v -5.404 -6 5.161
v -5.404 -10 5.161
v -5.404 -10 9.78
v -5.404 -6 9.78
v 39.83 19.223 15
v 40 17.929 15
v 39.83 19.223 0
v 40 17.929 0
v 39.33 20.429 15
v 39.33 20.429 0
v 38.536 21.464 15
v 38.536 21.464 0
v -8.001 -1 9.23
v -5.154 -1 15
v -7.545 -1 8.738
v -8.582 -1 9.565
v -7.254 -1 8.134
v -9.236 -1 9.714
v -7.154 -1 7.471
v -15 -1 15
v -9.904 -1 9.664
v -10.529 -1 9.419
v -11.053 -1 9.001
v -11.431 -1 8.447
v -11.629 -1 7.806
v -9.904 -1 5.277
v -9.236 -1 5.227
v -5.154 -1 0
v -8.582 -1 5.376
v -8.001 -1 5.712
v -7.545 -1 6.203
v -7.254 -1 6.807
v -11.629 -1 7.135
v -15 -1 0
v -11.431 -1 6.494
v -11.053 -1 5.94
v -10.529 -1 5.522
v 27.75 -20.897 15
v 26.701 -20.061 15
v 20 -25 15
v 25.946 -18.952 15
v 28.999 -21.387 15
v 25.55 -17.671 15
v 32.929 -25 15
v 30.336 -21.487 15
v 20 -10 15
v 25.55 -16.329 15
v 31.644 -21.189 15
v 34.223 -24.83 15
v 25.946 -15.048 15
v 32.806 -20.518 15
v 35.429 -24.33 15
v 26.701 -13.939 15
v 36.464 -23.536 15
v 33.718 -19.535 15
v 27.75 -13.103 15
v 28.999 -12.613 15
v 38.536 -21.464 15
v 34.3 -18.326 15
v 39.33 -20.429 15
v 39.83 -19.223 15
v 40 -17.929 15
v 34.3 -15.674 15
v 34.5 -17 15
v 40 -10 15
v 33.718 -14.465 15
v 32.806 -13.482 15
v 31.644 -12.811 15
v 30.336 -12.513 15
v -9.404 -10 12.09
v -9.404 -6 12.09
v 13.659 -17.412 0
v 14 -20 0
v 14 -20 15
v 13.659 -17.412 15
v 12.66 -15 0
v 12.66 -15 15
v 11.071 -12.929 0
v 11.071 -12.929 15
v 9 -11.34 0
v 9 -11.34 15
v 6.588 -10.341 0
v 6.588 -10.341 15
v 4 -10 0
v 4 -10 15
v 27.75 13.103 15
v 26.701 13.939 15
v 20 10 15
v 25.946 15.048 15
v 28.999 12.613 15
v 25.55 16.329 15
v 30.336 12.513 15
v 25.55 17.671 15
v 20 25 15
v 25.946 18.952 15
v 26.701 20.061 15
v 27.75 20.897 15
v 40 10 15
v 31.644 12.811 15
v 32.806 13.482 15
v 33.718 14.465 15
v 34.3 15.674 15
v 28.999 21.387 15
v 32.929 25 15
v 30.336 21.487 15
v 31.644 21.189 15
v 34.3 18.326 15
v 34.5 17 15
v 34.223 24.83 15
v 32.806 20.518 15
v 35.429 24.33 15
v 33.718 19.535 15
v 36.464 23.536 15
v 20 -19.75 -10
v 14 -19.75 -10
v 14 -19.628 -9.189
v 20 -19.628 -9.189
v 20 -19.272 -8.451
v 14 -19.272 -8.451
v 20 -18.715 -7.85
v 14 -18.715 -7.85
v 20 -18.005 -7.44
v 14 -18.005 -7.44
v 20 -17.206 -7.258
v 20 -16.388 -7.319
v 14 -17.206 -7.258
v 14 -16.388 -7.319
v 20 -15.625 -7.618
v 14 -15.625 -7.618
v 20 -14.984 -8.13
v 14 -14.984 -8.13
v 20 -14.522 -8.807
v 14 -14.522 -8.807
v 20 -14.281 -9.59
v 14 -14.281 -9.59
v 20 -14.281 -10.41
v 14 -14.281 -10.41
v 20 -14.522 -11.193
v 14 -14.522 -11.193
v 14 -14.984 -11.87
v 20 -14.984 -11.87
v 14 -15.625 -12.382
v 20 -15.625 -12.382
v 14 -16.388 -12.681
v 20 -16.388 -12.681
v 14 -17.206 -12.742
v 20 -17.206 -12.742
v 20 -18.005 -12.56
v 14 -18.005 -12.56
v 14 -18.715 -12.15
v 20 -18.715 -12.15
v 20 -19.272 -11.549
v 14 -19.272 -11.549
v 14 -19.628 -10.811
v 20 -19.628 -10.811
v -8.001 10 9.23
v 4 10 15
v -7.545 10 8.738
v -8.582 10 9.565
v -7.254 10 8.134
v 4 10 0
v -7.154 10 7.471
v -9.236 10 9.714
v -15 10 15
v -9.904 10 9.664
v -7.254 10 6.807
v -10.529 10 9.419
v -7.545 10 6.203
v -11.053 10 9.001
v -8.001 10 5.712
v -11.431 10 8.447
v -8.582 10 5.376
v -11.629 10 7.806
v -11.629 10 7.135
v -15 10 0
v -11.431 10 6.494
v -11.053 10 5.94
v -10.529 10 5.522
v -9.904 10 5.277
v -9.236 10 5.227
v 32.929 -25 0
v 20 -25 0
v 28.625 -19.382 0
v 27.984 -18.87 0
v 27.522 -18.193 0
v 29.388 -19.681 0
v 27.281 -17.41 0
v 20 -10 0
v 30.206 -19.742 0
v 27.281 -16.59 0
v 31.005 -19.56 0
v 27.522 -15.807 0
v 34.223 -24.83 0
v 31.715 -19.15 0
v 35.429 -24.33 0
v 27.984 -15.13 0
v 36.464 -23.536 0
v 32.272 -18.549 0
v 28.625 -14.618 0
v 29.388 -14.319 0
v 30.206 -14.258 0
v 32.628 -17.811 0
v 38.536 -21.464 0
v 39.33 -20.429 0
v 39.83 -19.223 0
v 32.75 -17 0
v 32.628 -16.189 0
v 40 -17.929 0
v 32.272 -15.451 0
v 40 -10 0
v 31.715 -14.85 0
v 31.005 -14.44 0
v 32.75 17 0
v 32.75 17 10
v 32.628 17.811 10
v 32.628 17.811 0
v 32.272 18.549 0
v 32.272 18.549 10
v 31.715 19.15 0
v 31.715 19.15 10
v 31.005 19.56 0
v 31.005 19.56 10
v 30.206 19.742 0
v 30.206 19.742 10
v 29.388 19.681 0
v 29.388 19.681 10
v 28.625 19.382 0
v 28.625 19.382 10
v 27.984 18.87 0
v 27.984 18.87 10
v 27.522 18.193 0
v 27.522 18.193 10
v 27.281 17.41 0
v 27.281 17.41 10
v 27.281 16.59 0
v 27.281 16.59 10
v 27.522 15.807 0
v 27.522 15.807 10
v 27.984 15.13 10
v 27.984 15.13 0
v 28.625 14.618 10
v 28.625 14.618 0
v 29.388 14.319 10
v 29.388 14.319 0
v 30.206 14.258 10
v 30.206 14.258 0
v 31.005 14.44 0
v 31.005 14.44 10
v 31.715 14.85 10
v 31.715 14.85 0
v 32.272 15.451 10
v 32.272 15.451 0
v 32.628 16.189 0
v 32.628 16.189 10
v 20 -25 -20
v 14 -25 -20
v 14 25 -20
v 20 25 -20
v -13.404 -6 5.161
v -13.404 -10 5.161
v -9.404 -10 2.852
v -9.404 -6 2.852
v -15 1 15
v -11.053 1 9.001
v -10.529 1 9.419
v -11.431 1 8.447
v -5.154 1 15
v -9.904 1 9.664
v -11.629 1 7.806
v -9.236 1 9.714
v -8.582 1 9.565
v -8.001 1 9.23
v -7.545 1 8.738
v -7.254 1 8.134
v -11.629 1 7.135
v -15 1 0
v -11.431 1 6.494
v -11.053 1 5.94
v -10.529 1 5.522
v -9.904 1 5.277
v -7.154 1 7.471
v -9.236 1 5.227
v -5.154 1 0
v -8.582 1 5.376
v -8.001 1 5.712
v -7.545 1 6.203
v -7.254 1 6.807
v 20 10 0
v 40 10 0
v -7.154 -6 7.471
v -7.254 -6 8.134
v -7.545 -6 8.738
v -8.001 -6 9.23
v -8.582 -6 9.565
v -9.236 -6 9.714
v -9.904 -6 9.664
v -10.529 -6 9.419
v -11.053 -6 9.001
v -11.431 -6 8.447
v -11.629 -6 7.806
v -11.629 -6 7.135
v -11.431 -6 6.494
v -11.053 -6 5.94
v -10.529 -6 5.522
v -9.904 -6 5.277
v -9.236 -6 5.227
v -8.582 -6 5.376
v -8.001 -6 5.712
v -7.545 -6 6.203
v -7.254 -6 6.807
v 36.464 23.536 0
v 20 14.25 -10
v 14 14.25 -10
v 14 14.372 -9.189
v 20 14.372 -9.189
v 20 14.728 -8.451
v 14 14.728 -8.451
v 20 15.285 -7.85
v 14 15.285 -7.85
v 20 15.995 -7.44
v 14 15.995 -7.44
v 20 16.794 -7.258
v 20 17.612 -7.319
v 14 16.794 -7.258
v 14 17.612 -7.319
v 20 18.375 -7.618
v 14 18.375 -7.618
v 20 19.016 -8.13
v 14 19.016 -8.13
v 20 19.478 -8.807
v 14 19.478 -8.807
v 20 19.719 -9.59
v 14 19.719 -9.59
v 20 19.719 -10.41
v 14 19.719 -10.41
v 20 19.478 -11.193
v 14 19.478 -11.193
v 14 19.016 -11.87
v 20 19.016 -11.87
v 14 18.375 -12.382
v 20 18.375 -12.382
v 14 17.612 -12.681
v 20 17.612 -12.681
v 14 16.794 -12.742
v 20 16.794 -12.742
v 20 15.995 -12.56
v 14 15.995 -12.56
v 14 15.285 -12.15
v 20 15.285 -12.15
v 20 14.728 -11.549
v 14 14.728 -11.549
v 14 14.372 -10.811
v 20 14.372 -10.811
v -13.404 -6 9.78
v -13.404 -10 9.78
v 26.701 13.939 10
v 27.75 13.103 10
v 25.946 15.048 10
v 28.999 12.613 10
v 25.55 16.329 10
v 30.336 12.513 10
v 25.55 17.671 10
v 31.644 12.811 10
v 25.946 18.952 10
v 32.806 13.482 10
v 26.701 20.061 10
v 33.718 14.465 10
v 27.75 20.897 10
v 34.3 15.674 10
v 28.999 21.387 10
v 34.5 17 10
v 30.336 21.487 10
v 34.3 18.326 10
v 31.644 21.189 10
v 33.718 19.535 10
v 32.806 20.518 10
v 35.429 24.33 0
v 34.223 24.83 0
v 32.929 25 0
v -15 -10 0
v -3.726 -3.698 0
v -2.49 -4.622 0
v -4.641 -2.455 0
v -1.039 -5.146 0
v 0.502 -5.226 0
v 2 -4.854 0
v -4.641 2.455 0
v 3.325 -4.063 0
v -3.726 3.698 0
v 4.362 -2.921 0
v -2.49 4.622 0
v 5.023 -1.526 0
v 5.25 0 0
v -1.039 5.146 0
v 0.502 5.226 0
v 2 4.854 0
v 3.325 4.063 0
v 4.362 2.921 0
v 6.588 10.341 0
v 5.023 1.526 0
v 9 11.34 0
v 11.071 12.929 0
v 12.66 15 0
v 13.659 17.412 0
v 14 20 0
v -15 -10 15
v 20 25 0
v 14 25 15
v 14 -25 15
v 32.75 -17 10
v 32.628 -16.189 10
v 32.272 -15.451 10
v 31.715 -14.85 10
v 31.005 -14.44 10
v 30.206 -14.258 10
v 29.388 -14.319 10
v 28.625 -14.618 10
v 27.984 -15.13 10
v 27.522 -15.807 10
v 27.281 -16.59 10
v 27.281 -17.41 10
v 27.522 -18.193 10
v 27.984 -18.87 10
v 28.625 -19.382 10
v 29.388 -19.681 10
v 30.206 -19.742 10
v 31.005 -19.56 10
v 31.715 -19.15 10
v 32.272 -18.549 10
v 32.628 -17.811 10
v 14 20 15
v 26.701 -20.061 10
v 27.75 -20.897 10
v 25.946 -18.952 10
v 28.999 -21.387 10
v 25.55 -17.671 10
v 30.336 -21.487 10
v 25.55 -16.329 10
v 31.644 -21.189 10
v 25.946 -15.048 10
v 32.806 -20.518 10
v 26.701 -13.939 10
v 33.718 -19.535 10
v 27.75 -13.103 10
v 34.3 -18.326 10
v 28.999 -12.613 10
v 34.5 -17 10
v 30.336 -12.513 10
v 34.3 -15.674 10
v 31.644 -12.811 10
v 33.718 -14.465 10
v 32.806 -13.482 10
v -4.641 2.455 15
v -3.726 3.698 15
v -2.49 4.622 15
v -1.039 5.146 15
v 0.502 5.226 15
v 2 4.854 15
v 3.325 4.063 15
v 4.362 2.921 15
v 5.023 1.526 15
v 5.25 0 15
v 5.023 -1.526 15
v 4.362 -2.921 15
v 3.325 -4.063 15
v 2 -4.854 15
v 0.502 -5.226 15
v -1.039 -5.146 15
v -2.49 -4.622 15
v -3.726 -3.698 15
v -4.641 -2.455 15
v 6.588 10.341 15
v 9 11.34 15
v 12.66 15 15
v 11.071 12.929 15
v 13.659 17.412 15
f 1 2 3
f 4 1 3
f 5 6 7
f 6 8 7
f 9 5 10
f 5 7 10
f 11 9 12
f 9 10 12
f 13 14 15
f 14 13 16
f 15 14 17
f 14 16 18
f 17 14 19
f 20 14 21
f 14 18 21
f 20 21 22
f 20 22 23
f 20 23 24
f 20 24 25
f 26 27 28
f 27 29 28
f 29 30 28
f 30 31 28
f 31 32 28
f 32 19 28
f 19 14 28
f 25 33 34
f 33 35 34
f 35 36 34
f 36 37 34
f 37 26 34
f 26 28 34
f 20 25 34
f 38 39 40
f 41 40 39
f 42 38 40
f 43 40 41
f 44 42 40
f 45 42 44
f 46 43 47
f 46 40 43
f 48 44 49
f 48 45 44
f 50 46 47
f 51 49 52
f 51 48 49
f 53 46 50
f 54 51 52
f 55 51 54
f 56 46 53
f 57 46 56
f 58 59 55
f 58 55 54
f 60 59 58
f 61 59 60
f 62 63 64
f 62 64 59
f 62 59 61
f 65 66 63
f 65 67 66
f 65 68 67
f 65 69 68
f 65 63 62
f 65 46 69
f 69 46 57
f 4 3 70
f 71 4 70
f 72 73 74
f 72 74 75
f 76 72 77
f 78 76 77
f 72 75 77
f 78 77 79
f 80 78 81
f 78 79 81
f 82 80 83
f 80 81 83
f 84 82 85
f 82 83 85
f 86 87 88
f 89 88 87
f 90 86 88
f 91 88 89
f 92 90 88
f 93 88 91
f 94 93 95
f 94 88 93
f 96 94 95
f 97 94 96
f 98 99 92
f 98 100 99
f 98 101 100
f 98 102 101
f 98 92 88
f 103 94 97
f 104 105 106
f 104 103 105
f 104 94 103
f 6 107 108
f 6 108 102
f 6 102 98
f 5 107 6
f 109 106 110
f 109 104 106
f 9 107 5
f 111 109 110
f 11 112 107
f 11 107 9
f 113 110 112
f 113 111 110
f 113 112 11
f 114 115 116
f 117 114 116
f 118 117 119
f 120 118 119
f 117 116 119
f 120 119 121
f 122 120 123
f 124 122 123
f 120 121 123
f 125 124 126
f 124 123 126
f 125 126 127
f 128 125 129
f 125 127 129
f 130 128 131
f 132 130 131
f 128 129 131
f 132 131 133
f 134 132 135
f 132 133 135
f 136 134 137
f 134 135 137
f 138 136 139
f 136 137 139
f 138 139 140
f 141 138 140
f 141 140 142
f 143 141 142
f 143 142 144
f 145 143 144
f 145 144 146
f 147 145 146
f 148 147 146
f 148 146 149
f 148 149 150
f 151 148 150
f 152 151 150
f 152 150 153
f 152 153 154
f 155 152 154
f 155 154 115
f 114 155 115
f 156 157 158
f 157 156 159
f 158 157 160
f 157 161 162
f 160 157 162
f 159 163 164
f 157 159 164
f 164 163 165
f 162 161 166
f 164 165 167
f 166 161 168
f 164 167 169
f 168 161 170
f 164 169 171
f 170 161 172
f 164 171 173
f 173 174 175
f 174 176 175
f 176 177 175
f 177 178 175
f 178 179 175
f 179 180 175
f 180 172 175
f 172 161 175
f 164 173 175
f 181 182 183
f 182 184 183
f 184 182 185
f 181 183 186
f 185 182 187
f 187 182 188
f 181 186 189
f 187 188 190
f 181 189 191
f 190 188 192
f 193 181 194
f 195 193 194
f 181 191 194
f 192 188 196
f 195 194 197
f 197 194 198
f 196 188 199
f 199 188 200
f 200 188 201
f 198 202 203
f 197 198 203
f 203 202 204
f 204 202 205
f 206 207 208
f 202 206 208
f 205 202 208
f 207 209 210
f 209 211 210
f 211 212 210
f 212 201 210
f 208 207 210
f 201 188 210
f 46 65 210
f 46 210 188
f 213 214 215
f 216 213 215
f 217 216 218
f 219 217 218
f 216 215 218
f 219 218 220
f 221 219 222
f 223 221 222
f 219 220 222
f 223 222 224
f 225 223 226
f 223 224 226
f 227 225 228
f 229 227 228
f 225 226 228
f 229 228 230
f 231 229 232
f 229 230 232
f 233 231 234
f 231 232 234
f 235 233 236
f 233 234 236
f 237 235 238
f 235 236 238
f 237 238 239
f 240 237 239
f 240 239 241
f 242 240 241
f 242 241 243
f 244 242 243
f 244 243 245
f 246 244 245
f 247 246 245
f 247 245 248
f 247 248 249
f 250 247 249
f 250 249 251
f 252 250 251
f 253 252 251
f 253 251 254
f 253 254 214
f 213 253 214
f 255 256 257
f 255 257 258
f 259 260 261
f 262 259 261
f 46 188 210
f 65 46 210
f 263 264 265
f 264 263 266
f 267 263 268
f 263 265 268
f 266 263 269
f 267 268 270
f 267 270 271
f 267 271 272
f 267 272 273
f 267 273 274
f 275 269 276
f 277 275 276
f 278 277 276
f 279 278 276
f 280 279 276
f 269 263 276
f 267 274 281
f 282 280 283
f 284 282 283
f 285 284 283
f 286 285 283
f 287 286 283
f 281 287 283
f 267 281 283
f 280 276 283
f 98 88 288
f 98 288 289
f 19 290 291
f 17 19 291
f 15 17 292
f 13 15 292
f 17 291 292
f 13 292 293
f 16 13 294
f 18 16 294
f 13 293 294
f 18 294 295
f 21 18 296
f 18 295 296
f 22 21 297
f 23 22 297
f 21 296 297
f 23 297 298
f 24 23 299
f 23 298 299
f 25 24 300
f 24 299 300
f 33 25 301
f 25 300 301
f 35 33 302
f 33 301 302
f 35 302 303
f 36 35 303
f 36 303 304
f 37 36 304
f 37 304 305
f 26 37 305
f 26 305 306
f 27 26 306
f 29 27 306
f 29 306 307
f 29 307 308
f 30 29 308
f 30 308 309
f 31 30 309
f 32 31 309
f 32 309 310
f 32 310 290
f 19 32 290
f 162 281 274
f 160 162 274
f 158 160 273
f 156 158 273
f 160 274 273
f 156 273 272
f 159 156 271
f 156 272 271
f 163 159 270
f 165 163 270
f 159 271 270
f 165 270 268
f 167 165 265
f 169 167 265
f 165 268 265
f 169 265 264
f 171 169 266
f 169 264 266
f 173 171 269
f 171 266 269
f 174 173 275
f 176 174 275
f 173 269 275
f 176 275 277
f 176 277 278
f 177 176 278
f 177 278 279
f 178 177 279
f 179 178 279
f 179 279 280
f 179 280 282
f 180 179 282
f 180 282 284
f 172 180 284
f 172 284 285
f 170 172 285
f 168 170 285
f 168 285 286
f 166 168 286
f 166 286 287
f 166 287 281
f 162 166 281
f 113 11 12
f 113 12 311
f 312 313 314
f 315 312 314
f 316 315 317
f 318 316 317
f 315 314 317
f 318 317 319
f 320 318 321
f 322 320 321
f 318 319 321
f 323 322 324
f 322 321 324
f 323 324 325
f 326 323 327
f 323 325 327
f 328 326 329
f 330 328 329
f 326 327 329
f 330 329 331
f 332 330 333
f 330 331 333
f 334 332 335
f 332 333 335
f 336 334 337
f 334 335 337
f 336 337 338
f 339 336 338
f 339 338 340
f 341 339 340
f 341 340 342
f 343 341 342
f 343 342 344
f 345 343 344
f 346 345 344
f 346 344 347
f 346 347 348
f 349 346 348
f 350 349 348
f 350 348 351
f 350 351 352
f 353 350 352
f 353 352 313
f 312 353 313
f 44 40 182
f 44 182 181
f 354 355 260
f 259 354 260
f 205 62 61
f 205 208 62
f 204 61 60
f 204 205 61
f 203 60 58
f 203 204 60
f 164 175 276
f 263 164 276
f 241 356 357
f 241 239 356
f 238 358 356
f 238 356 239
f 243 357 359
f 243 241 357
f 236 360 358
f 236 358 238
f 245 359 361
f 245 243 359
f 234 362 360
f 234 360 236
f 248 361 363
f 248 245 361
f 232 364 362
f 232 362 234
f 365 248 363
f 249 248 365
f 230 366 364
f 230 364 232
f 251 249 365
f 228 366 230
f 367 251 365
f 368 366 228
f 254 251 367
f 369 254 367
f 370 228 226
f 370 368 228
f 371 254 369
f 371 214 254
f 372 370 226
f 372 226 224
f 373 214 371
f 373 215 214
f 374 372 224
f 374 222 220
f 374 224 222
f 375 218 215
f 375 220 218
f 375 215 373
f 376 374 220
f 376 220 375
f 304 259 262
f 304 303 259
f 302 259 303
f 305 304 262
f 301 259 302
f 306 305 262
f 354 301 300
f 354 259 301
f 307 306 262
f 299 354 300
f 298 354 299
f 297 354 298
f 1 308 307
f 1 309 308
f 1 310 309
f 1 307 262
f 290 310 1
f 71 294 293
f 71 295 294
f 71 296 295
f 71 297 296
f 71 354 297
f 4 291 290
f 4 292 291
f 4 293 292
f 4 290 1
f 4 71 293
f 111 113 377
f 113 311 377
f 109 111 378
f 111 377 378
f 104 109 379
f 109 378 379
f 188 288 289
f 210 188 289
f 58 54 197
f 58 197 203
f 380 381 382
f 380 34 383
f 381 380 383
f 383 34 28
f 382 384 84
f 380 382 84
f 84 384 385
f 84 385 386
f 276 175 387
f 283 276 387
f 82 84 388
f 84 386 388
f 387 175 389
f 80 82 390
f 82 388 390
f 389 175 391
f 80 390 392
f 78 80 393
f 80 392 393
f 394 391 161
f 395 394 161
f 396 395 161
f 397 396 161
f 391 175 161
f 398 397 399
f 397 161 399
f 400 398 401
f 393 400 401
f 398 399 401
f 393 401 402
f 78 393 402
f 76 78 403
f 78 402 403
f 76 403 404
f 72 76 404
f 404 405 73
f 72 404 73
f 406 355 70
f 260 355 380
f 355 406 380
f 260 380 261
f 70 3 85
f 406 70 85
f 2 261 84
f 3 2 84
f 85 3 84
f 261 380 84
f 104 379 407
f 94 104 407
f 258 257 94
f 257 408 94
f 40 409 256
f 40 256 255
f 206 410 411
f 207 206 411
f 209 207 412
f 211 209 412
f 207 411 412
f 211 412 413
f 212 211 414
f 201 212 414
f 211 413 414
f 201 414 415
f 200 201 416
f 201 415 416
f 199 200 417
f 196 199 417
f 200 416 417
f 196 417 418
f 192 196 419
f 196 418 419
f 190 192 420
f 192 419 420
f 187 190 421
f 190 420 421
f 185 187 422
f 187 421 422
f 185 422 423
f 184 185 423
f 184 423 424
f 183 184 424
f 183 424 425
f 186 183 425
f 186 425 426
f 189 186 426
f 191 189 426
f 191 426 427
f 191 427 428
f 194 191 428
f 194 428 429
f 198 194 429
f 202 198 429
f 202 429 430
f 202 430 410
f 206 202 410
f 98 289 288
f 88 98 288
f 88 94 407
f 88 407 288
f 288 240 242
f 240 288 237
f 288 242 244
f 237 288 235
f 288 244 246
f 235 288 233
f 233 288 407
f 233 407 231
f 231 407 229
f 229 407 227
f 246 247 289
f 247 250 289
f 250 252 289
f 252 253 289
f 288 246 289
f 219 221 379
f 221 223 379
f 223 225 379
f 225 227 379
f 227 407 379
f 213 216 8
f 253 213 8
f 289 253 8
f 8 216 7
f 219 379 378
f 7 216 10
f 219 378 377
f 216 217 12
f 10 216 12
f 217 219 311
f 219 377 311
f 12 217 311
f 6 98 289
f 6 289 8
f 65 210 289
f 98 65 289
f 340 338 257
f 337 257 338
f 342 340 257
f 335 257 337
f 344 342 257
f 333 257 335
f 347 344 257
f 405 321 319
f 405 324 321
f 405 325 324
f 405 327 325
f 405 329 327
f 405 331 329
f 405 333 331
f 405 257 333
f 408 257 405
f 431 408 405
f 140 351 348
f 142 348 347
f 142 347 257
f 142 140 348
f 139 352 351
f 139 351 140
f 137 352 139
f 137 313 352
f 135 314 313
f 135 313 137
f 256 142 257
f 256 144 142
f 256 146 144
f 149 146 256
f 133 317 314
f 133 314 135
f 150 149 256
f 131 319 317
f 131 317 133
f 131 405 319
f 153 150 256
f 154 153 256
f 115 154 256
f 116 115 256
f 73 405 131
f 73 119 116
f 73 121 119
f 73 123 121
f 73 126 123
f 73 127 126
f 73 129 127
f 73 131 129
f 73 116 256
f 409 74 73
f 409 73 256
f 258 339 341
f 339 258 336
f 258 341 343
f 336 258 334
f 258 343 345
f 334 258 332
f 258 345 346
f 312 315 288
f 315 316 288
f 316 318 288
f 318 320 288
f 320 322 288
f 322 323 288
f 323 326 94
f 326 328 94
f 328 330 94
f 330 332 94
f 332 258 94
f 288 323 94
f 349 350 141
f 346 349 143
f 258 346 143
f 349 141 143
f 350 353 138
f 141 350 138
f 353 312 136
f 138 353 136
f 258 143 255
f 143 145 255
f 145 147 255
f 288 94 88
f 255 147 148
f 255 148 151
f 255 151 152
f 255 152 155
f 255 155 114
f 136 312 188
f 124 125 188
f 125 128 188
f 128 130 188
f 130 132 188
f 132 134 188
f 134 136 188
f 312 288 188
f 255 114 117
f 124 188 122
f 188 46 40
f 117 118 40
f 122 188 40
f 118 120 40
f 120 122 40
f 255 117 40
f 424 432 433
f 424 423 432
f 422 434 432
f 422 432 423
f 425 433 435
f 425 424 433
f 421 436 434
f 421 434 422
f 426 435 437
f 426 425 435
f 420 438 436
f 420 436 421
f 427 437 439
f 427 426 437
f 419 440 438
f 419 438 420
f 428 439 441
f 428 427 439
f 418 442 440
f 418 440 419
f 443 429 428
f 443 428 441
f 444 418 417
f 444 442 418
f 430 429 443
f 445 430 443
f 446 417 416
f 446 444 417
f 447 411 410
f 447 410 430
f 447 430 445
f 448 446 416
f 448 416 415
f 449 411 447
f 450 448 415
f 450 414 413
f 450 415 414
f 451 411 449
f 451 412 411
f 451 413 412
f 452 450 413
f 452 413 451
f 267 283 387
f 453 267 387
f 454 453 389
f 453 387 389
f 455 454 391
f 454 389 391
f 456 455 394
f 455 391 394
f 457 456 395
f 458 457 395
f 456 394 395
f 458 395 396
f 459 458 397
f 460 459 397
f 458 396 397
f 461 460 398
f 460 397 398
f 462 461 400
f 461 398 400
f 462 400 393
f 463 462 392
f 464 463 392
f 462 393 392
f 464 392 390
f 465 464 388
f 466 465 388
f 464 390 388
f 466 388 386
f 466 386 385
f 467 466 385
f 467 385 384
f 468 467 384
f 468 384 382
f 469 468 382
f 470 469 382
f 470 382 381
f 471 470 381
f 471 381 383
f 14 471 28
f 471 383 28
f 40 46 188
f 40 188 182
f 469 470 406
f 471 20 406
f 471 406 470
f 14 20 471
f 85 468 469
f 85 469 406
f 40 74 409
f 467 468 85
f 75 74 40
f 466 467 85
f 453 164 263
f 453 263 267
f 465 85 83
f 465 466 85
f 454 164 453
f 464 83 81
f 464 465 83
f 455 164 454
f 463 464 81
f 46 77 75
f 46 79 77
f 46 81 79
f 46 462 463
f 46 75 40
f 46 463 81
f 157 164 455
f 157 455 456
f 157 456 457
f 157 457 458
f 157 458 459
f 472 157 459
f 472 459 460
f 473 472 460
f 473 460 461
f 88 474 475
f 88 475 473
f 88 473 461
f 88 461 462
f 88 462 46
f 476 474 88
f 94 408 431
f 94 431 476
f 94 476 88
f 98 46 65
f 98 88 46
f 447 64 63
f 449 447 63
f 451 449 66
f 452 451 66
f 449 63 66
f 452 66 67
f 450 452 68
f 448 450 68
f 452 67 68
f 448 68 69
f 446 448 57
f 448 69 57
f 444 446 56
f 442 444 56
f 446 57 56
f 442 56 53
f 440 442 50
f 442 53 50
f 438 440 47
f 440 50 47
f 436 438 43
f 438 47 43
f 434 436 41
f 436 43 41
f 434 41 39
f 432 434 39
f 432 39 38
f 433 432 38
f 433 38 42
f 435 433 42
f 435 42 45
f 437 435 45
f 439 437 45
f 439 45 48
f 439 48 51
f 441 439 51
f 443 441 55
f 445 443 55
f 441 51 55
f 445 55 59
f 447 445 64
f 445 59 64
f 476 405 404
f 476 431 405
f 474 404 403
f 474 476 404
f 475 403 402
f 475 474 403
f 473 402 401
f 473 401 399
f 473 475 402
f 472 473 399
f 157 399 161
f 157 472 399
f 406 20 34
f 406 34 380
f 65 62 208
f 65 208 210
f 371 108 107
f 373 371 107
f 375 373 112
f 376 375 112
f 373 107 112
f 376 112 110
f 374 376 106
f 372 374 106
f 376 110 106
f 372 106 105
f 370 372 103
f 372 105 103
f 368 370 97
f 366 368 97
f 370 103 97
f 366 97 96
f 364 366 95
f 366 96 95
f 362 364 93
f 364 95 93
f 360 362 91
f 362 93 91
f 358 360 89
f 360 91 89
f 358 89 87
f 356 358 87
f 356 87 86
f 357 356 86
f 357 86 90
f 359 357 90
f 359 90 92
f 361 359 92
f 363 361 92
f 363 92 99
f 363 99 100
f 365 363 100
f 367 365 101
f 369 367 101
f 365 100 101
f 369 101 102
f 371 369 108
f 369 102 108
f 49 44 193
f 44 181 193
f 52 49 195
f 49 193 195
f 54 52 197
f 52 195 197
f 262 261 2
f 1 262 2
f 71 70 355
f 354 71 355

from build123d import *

# Parameters (mm, degrees)
F1_DEPTH  = 15
F2_W      = 6
F2_H      = 15
F3_DEPTH  = 15
F4_W      = 6
F4_H      = 15
F5_DEPTH  = 15
F6_W      = 6
F6_H      = 50
F7_DEPTH  = 20
F8_R      = 2.75
F9_DEPTH  = 10
F11_DEPTH = 15
F12_R     = 10
F13_R     = 5
F13_2_R   = 5
F14_R     = 2.25
F15_DEPTH = 25
F16_DEPTH = 4
F17_R     = 2.75
F18_DEPTH = 20
F17_R_2   = 4.5
F19_DEPTH = 5
F20_R     = 2.75
F21_DEPTH = 20
F20_R_2   = 4.5
F22_DEPTH = 5


with BuildPart() as f1:
    # F0 (on Top) → F1 (new body)
    with BuildSketch(Plane.XY):
        with BuildLine():
            ThreePointArc((-5.153882032, 1), (5.25, 0), (-5.153882032, -1))
            Line((-5.153882032, -1), (-15, -1))
            Line((-15, -1), (-15, -10))
            Line((-15, -10), (40, -10))
            Line((40, -10), (40, 10))
            Line((40, 10), (-15, 10))
            Line((-15, 10), (-15, 1))
            Line((-15, 1), (-5.153882032, 1))
        make_face()
    extrude(amount=F1_DEPTH)

    # F2 (on face) → F3 (join)
    with BuildSketch(Plane.XZ.offset(10)):
        with Locations((17, 7.5)):
            Rectangle(F2_W, F2_H)
    extrude(amount=F3_DEPTH)

    # F4 (on face) → F5 (join)
    with BuildSketch(Plane(origin=(0, 10, 0), x_dir=(-1, 0, 0), z_dir=(0, 1, 0))):
        with Locations((-17, 7.5)):
            Rectangle(F4_W, F4_H)
    extrude(amount=F5_DEPTH)

    # F6 (on face) → F7 (join)
    with BuildSketch(Plane(origin=(0, 0, 0), x_dir=(1, 0, 0), z_dir=(0, 0, -1))):
        with Locations((17, 0)):
            Rectangle(F6_W, F6_H)
    extrude(amount=F7_DEPTH)

    # F8 (on face) → F9 (cut)
    with BuildSketch(Plane(origin=(14, 0, 0), x_dir=(0, -1, 0), z_dir=(-1, 0, 0))):
        with Locations((-17, -10)):
            Circle(F8_R)
        with Locations((17, -10)):
            Circle(F8_R)
    extrude(amount=-F9_DEPTH, mode=Mode.SUBTRACT)

    # F12
    f12_edges = [f1.edges().sort_by_distance(p)[0] for p in [
        (14, -10, 7.5),
        (14, 10, 7.5),
    ]]
    fillet(f12_edges, radius=F12_R)

    # F14 (on face) → F15 (cut)
    with BuildSketch(Plane.XZ.offset(10)):
        with Locations((-9.4037707895, 7.4706980959)):
            Circle(F14_R)
    extrude(amount=-F15_DEPTH, mode=Mode.SUBTRACT)

    # F14 (on face) → F16 (cut)
    with BuildSketch(Plane.XZ.offset(10)):
        Polygon((-5.4037707895, 5.1612970191), (-5.4037707895, 9.7800991726), (-9.4037707895, 12.0895002494), (-13.4037707895, 9.7800991726), (-13.4037707895, 5.1612970191), (-9.4037707895, 2.8518959423), align=None)
        with Locations((-9.4037707895, 7.4706980959)):
            Circle(F14_R, mode=Mode.SUBTRACT)
    extrude(amount=-F16_DEPTH, mode=Mode.SUBTRACT)


with BuildPart() as f11:
    # F10 (on face) → F11 (new body)
    with BuildSketch(Plane.XY.offset(15)):
        Polygon((20, 25), (20, 10), (40, 10), (40, 20), (35, 25), align=None)
    extrude(amount=-F11_DEPTH)

    # F13#2
    f13_2_edges = [f11.edges().sort_by_distance(p)[0] for p in [
        (40, 20, 7.5),
        (35, 25, 7.5),
    ]]
    fillet(f13_2_edges, radius=F13_2_R)

    # F17 (on face) → F18 (cut)
    with BuildSketch(Plane.XY.offset(15)):
        with Locations((30, 17)):
            Circle(F17_R)
    extrude(amount=-F18_DEPTH, mode=Mode.SUBTRACT)

    # F17 (on face) → F19 (cut)
    with BuildSketch(Plane.XY.offset(15)):
        with Locations((30, 17)):
            Circle(F17_R_2)
        with Locations((30, 17)):
            Circle(F17_R, mode=Mode.SUBTRACT)
    extrude(amount=-F19_DEPTH, mode=Mode.SUBTRACT)


with BuildPart() as f11b:
    # F10 (on face) → F11, piece 2 (new body)
    with BuildSketch(Plane.XY.offset(15)):
        Polygon((40, -20), (40, -10), (20, -10), (20, -25), (35, -25), align=None)
    extrude(amount=-F11_DEPTH)

    # F13
    f13_edges = [f11b.edges().sort_by_distance(p)[0] for p in [
        (35, -25, 7.5),
        (40, -20, 7.5),
    ]]
    fillet(f13_edges, radius=F13_R)

    # F20 (on face) → F21 (cut)
    with BuildSketch(Plane.XY.offset(15)):
        with Locations((30, -17)):
            Circle(F20_R)
    extrude(amount=-F21_DEPTH, mode=Mode.SUBTRACT)

    # F20 (on face) → F22 (cut)
    with BuildSketch(Plane.XY.offset(15)):
        with Locations((30, -17)):
            Circle(F20_R_2)
        with Locations((30, -17)):
            Circle(F20_R, mode=Mode.SUBTRACT)
    extrude(amount=-F22_DEPTH, mode=Mode.SUBTRACT)


solid = Compound([f1.part, f11.part, f11b.part])
